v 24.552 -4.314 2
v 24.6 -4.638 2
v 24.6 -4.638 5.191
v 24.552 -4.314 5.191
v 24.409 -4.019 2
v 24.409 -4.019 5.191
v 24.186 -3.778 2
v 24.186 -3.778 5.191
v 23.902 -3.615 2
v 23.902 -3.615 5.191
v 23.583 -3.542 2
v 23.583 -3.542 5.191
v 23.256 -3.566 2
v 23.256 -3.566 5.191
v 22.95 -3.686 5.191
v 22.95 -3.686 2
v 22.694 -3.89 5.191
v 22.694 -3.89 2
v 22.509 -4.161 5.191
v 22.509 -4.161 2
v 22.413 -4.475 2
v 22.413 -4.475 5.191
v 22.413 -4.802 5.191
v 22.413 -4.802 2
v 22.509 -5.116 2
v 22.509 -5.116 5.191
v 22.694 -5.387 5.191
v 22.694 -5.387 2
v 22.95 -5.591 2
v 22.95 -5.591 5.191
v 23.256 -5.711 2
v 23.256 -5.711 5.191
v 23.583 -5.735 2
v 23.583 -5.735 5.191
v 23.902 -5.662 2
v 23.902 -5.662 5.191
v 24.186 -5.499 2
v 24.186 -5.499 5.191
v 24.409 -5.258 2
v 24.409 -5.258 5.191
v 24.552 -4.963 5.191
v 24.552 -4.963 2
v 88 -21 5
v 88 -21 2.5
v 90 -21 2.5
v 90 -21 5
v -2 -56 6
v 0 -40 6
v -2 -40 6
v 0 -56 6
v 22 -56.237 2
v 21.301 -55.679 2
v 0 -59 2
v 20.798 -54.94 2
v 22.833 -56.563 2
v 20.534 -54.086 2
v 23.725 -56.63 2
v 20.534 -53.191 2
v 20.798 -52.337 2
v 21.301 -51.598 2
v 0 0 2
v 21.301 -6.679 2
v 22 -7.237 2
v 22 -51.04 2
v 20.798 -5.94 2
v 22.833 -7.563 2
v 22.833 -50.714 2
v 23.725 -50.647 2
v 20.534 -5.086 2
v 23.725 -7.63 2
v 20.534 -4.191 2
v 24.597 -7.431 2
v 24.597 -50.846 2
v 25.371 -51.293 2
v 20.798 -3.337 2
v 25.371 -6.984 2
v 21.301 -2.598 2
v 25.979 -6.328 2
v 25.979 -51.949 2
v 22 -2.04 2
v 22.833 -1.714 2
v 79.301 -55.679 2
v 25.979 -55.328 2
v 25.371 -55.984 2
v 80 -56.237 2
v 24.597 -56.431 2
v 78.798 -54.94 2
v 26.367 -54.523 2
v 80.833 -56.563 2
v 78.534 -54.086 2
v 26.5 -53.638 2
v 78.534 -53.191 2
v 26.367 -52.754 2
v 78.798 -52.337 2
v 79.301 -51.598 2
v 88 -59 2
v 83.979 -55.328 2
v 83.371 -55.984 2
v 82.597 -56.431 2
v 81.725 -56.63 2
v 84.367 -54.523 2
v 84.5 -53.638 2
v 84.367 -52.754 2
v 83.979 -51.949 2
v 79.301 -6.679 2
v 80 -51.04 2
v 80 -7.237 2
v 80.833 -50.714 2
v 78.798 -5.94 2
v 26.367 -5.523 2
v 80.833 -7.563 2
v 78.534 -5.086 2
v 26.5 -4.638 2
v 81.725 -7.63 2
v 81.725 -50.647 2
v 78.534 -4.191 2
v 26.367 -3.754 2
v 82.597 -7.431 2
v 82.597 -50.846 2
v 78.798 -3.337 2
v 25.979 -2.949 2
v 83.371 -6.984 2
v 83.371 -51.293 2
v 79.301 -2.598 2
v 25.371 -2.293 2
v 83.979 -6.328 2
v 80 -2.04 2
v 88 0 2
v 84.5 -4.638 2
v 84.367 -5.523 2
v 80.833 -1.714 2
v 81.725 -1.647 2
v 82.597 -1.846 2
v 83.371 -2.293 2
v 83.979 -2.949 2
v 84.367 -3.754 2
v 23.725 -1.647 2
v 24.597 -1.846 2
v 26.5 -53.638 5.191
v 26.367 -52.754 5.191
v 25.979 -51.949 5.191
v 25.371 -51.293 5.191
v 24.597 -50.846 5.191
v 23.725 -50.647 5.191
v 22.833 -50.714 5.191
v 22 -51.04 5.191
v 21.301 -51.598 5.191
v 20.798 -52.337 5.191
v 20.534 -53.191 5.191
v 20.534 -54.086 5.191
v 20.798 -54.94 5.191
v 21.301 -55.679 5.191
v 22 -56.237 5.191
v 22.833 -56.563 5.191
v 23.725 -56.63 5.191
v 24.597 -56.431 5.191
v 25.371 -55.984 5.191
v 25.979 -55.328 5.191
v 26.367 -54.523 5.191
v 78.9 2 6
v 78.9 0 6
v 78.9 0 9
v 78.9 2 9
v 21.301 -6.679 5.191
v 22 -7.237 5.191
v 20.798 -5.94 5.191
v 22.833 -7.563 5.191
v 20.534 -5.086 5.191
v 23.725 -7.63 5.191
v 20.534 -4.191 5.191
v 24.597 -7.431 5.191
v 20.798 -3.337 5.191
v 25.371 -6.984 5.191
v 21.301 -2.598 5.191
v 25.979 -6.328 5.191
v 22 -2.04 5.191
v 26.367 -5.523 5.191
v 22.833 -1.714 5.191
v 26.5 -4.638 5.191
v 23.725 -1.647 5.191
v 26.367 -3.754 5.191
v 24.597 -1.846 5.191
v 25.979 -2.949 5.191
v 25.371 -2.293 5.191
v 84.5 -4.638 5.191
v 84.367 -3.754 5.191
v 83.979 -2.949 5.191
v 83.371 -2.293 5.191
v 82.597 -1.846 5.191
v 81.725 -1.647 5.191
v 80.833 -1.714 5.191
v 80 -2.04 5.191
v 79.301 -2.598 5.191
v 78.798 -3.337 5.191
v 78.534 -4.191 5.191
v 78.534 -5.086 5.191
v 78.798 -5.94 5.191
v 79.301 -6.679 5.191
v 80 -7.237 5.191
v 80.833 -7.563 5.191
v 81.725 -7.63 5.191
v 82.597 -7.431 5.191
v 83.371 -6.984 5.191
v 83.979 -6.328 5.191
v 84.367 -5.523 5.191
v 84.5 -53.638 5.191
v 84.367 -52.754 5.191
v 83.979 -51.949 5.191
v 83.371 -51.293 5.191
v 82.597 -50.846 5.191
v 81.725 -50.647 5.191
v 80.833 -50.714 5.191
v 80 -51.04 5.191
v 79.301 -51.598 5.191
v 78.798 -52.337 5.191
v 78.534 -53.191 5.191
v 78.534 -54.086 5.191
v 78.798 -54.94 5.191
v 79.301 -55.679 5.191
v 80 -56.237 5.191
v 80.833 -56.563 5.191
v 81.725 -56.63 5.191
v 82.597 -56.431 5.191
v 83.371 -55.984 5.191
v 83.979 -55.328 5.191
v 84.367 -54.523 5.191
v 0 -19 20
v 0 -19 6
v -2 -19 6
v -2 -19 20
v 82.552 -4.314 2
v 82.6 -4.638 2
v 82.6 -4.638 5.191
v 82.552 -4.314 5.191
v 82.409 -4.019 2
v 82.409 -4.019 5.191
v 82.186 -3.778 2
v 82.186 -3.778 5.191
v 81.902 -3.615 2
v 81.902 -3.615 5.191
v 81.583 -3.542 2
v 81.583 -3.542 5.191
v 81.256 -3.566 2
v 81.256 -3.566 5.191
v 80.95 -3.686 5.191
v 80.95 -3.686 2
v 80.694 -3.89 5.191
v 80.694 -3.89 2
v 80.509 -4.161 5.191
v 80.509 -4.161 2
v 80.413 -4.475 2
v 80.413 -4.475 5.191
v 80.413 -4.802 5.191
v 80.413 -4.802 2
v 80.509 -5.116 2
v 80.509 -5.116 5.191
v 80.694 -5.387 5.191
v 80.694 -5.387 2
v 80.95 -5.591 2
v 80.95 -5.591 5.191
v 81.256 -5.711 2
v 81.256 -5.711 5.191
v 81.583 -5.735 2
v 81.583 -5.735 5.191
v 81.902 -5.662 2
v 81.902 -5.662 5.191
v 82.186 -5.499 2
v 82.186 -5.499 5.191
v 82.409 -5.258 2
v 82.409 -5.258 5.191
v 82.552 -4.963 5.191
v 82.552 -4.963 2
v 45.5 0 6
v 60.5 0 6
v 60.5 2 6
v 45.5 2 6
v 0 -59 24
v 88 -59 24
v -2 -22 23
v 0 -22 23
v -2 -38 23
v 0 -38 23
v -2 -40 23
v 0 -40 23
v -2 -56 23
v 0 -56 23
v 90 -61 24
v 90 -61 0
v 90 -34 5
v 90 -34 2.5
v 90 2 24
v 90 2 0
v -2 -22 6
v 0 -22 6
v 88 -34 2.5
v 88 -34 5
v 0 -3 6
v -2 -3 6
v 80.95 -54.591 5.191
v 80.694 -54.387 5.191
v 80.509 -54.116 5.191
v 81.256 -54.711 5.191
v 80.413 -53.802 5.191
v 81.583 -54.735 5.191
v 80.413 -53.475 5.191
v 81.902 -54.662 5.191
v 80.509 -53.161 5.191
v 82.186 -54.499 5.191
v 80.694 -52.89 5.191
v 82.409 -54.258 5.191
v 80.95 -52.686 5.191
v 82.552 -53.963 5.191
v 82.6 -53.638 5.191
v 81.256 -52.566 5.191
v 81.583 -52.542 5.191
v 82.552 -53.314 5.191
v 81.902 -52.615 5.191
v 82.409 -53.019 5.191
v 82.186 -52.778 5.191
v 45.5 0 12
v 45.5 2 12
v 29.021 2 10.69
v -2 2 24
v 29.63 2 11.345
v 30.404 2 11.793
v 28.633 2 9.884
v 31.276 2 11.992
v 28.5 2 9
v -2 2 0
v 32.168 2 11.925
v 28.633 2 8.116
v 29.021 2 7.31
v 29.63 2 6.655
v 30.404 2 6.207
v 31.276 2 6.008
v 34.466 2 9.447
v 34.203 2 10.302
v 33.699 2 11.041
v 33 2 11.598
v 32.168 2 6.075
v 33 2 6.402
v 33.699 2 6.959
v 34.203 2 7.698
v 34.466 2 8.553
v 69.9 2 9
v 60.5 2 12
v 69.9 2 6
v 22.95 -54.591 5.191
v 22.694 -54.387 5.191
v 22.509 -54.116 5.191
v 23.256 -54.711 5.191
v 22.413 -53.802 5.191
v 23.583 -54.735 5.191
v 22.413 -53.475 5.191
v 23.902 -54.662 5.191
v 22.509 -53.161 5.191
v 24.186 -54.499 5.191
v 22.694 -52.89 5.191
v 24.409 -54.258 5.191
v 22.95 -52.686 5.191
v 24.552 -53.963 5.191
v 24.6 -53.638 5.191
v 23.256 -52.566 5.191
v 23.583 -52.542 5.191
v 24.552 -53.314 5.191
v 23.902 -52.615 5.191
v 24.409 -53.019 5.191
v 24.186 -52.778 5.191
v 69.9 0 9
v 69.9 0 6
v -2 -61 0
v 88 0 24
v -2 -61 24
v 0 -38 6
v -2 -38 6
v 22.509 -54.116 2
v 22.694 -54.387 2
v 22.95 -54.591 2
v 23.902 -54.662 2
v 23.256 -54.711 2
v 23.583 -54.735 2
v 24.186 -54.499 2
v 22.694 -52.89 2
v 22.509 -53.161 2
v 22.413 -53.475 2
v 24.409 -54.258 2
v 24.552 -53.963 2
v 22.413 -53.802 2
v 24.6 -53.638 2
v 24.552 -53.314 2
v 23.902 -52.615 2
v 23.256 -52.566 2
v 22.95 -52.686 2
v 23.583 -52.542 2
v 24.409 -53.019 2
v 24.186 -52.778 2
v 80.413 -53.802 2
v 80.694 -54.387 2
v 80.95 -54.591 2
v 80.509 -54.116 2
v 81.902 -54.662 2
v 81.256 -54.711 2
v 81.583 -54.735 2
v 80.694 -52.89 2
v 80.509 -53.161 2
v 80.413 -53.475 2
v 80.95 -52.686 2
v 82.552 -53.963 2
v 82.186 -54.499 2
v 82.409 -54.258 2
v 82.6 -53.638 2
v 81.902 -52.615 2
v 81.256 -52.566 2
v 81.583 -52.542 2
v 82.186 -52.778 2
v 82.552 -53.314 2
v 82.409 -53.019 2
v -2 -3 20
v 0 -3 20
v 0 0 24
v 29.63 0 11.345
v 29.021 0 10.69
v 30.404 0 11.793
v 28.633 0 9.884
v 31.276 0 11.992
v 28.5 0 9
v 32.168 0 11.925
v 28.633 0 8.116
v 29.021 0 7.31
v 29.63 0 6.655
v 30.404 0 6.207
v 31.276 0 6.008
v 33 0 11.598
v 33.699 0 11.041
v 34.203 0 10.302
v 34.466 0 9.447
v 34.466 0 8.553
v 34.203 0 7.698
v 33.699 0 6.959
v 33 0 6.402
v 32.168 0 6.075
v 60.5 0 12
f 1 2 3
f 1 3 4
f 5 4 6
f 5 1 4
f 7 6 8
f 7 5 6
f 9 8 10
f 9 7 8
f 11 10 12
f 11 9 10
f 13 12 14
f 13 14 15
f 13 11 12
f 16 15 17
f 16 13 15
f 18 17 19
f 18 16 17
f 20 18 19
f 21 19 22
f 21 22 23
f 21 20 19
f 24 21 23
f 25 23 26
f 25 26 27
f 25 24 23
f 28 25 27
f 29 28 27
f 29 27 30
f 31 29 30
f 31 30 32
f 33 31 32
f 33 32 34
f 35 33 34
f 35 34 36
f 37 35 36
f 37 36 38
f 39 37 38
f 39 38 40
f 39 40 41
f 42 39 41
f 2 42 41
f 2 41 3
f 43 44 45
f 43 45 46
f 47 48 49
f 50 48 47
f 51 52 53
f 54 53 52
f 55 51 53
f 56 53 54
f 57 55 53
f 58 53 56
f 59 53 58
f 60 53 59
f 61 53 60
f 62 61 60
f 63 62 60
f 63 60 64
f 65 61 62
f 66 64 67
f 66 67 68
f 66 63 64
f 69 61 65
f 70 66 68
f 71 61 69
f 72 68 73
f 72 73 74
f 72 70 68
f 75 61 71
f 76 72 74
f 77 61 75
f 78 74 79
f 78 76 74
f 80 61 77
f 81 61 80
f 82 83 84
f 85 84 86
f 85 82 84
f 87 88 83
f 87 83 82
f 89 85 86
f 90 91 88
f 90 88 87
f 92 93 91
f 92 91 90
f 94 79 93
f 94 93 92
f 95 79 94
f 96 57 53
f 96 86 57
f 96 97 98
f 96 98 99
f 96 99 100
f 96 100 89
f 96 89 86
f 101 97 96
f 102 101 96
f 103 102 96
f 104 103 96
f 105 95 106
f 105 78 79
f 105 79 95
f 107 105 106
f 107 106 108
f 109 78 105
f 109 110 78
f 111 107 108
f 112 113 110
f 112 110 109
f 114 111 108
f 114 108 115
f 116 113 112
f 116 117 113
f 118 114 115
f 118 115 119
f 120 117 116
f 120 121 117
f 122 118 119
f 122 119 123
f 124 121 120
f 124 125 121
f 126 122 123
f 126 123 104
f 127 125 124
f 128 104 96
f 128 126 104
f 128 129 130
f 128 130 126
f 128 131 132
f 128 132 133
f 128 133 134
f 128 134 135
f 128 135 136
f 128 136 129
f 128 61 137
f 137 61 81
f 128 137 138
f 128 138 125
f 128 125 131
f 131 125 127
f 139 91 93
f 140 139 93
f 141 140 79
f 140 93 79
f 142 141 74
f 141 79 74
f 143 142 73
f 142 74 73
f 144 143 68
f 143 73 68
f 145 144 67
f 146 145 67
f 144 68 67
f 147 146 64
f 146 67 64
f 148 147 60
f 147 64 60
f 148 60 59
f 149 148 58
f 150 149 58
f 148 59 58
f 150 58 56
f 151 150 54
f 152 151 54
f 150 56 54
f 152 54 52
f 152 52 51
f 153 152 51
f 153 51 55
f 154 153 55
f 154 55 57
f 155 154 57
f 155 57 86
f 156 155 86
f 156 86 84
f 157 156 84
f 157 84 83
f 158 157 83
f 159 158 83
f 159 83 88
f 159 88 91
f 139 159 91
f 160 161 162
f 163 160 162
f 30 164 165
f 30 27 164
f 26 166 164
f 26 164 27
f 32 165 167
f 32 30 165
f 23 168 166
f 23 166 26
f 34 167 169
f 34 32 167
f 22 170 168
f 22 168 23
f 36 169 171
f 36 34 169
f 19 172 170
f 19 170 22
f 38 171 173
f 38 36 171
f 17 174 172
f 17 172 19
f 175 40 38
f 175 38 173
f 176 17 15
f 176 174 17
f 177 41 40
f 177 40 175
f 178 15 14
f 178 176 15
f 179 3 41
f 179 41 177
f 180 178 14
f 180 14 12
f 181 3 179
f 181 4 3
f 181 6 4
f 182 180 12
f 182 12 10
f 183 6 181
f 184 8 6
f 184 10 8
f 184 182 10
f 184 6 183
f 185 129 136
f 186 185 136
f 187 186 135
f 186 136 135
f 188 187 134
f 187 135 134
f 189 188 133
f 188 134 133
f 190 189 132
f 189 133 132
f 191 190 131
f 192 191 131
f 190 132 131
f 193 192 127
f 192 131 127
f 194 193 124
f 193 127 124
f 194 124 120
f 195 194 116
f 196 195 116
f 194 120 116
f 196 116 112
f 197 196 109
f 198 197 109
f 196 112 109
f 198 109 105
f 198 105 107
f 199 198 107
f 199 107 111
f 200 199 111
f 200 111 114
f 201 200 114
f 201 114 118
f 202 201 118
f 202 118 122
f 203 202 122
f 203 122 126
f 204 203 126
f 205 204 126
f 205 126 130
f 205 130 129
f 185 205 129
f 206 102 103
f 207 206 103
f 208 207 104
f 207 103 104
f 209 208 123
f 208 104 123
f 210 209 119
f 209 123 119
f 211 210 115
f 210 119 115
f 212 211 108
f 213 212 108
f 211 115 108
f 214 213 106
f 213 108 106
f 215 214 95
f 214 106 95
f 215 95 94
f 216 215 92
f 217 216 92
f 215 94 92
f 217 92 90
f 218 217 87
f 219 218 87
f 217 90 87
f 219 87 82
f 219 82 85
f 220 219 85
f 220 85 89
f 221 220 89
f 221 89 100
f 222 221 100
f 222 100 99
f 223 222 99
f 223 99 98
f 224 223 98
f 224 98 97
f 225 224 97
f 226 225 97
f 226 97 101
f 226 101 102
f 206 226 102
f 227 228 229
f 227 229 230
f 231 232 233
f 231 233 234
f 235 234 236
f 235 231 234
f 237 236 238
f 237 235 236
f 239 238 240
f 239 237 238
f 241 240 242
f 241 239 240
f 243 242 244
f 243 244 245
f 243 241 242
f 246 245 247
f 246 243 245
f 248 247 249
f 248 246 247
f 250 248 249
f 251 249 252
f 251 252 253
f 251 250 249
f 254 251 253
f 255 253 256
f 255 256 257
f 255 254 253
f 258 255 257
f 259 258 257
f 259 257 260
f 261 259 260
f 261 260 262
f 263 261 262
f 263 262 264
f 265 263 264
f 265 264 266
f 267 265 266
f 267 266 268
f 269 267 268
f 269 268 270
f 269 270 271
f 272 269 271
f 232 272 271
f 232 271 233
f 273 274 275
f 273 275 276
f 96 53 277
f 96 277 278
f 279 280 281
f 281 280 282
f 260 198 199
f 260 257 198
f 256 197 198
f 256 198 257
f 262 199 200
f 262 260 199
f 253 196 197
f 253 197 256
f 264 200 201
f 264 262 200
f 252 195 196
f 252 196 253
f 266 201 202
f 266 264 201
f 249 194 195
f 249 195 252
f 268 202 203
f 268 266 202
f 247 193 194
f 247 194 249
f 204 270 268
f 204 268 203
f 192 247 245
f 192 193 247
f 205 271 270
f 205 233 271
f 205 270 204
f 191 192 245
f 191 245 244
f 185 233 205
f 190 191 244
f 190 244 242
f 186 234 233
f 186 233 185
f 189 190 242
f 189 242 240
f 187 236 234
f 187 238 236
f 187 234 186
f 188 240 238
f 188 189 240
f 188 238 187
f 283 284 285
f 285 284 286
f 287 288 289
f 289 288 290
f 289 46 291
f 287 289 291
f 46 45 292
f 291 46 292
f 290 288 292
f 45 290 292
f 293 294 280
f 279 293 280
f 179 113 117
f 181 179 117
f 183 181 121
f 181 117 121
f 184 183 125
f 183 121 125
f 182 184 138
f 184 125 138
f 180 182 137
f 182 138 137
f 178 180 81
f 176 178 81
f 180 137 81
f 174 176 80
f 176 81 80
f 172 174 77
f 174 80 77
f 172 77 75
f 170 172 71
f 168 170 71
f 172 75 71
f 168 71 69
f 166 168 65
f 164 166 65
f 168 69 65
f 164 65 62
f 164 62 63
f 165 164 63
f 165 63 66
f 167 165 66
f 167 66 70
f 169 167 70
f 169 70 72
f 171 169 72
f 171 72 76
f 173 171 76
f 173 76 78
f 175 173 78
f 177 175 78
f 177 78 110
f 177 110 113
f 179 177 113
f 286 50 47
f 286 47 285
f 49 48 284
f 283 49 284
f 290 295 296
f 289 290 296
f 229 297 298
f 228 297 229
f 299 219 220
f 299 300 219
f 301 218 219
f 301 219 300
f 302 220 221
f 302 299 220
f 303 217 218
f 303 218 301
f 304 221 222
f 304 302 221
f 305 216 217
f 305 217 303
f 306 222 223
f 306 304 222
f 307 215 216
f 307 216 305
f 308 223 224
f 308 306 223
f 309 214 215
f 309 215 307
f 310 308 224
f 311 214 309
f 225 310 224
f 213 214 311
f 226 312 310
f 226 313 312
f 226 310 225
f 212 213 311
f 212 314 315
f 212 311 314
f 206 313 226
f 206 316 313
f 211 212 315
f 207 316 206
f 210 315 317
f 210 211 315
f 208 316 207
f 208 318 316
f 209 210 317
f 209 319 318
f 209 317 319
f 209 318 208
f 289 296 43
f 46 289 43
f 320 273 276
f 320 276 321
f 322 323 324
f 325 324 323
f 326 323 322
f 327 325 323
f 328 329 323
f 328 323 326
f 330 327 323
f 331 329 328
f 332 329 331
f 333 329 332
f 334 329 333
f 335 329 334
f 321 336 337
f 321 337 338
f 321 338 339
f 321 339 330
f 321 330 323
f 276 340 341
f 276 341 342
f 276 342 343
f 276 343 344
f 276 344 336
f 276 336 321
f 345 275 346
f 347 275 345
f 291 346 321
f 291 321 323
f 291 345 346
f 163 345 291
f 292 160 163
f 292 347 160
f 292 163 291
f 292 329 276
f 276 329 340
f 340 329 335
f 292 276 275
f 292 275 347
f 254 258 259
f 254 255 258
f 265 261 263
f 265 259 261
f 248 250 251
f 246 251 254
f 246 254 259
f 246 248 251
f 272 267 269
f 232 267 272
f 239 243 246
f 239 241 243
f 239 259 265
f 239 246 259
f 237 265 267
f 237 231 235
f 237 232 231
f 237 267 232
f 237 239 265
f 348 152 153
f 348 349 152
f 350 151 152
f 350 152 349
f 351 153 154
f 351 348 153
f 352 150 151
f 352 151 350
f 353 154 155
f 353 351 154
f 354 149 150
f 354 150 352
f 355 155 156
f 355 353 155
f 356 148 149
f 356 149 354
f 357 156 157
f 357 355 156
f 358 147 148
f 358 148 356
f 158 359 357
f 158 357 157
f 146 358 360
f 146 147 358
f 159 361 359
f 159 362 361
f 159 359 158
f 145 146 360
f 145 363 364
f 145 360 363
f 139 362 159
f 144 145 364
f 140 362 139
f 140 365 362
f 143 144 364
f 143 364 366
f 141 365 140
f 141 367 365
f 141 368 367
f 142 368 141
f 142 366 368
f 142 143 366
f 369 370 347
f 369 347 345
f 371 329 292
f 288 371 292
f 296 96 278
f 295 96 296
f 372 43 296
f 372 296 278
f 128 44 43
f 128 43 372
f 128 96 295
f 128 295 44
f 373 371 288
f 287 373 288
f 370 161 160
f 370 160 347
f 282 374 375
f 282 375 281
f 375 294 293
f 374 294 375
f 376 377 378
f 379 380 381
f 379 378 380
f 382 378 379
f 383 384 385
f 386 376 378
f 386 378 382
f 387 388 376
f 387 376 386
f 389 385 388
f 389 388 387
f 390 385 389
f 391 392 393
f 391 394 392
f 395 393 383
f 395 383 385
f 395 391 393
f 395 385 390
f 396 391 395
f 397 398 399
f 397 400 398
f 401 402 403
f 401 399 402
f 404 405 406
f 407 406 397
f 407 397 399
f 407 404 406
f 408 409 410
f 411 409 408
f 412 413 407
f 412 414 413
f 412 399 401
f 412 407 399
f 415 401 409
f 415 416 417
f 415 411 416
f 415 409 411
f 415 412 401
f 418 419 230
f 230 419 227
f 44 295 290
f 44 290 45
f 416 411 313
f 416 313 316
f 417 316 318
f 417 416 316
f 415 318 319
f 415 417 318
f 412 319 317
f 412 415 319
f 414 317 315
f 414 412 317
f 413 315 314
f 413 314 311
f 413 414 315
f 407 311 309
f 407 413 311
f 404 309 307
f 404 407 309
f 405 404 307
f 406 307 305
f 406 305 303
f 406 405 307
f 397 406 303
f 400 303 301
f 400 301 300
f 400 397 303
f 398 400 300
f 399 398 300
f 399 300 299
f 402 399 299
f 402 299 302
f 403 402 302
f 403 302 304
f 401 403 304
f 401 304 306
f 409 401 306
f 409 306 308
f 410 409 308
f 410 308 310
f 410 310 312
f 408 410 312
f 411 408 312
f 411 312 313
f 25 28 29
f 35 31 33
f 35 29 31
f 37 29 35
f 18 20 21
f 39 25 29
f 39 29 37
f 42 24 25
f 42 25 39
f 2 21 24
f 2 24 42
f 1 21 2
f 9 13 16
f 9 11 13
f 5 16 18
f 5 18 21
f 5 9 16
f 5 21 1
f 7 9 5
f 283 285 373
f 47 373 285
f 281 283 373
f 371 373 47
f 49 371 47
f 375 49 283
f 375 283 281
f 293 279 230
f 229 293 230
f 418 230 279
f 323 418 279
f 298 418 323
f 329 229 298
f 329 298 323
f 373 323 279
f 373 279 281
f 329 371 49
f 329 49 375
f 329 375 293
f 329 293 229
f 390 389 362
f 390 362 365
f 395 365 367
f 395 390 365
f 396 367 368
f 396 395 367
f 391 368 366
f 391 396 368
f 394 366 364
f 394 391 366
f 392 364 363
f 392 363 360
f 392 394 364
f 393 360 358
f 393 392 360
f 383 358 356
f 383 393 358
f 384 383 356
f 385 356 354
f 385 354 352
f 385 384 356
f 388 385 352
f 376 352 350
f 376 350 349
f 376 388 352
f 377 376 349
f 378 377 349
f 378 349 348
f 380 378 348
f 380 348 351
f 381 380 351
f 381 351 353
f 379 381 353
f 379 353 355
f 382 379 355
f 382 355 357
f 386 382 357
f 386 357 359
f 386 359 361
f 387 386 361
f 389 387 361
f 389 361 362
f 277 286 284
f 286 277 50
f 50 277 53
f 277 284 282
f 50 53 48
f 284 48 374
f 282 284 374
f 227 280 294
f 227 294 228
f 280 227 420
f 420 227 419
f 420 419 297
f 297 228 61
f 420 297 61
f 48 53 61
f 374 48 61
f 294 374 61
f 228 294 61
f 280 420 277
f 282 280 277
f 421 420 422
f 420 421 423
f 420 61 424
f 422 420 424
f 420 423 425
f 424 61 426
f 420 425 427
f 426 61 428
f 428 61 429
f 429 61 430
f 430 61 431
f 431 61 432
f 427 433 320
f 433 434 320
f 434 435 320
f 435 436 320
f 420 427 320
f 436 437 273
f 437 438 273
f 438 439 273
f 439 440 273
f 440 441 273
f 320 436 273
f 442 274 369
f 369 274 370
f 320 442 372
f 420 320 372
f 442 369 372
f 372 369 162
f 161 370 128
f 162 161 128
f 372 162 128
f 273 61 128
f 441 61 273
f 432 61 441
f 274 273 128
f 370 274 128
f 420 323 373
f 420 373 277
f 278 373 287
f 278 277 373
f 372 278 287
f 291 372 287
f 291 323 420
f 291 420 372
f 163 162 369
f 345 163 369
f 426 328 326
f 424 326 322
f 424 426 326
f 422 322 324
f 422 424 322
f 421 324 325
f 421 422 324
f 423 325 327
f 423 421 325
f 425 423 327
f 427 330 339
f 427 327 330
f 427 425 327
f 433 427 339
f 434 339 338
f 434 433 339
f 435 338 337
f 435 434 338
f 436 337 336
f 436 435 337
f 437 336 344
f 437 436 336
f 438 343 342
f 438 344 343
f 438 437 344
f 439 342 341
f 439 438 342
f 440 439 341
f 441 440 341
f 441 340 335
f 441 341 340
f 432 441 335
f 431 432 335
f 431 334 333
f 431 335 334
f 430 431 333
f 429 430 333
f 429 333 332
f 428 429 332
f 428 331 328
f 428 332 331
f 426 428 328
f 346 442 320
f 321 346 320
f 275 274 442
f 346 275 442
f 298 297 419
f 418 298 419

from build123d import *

# Parameters (mm, degrees)
SKETCH006_W   = 13
SKETCH006_H   = 2.5
PAD006_DEPTH  = 3
SKETCH005_R   = 3
SKETCH005_W   = 15
SKETCH005_H   = 6
SKETCH005_W_2 = 9
SKETCH005_H_2 = 3
PAD005_DEPTH  = 3
SKETCH004_W   = 16
SKETCH004_H   = 14
SKETCH004_H_2 = 17
PAD004_DEPTH  = 3
SKETCH003_W   = 92
SKETCH003_H   = 63
SKETCH003_W_2 = 88
SKETCH003_H_2 = 59
PAD003_DEPTH  = 24
SKETCH002_W   = 88
SKETCH002_H   = 59
PAD002_DEPTH  = 2
SKETCH_R      = 1.1
PAD_DEPTH     = 6.5
SKETCH001_R   = 3
PAD001_DEPTH  = 5


with BuildPart() as pad006:
    # Sketch006 → Pad006 (new body)
    with BuildSketch(Plane.YZ.offset(88)):
        with Locations((-27.5, 3.75)):
            Rectangle(SKETCH006_W, SKETCH006_H)
    extrude(amount=PAD006_DEPTH)


with BuildPart() as pad005:
    # Sketch005 → Pad005 (new body)
    with BuildSketch(Plane(origin=(0, 0, 0), x_dir=(-1, 0, 0), z_dir=(0, 1, 0))):
        with Locations((-31.5, 9)):
            Circle(SKETCH005_R)
        with Locations((-53, 9)):
            Rectangle(SKETCH005_W, SKETCH005_H)
        with Locations((-74.4, 7.5)):
            Rectangle(SKETCH005_W_2, SKETCH005_H_2)
    extrude(amount=PAD005_DEPTH)


with BuildPart() as pad004:
    # Sketch004 → Pad004 (new body)
    with BuildSketch(Plane(origin=(0, 0, 0), x_dir=(0, -1, 0), z_dir=(-1, 0, 0))):
        with Locations((11, 13)):
            Rectangle(SKETCH004_W, SKETCH004_H)
        with Locations((30, 14.5)):
            Rectangle(SKETCH004_W, SKETCH004_H_2)
        with Locations((48, 14.5)):
            Rectangle(SKETCH004_W, SKETCH004_H_2)
    extrude(amount=PAD004_DEPTH)


with BuildPart() as cut003:
    # Sketch003 → Pad003 (new body)
    with BuildSketch(Plane.XY):
        with Locations((44, -29.5)):
            Rectangle(SKETCH003_W, SKETCH003_H)
        with Locations((44, -29.5)):
            Rectangle(SKETCH003_W_2, SKETCH003_H_2, mode=Mode.SUBTRACT)
    extrude(amount=PAD003_DEPTH)

    # Cut001: cut Pad004
    add(pad004.part, mode=Mode.SUBTRACT)

    # Cut002: cut Pad005
    add(pad005.part, mode=Mode.SUBTRACT)

    # Cut003: cut Pad006
    add(pad006.part, mode=Mode.SUBTRACT)


with BuildPart() as base:
    # Sketch002 → Pad002 (new body)
    with BuildSketch(Plane.XY):
        with Locations((44, -29.5)):
            Rectangle(SKETCH002_W, SKETCH002_H)
    extrude(amount=PAD002_DEPTH)


with BuildPart() as pad:
    # Sketch → Pad (new body)
    with BuildSketch(Plane.XY.offset(2.5)):
        with Locations((23.5, -3.5)):
            Circle(SKETCH_R)
        with Locations((23.5, -52.5)):
            Circle(SKETCH_R)
        with Locations((81.5, -3.5)):
            Circle(SKETCH_R)
        with Locations((81.5, -52.5)):
            Circle(SKETCH_R)
    extrude(amount=PAD_DEPTH)


with BuildPart() as fusion001:
    # Sketch001 → Pad001 (new body)
    with BuildSketch(Plane.XY.offset(4)):
        with Locations((23.5, -3.5)):
            Circle(SKETCH001_R)
        with Locations((81.5, -3.5)):
            Circle(SKETCH001_R)
        with Locations((81.5, -52.5)):
            Circle(SKETCH001_R)
        with Locations((23.5, -52.5)):
            Circle(SKETCH001_R)
    extrude(amount=PAD001_DEPTH)

    # Cut: cut Pad
    add(pad.part, mode=Mode.SUBTRACT)


with BuildPart() as fusion001_1:
    # Cut placement: moved
    add(fusion001.part.moved(Location((0.000478, -1.138495, -3.808742))))

    # Fusion: union Base
    add(base.part)

    # Fusion001: union Cut003
    add(cut003.part)


solid = fusion001_1.part
